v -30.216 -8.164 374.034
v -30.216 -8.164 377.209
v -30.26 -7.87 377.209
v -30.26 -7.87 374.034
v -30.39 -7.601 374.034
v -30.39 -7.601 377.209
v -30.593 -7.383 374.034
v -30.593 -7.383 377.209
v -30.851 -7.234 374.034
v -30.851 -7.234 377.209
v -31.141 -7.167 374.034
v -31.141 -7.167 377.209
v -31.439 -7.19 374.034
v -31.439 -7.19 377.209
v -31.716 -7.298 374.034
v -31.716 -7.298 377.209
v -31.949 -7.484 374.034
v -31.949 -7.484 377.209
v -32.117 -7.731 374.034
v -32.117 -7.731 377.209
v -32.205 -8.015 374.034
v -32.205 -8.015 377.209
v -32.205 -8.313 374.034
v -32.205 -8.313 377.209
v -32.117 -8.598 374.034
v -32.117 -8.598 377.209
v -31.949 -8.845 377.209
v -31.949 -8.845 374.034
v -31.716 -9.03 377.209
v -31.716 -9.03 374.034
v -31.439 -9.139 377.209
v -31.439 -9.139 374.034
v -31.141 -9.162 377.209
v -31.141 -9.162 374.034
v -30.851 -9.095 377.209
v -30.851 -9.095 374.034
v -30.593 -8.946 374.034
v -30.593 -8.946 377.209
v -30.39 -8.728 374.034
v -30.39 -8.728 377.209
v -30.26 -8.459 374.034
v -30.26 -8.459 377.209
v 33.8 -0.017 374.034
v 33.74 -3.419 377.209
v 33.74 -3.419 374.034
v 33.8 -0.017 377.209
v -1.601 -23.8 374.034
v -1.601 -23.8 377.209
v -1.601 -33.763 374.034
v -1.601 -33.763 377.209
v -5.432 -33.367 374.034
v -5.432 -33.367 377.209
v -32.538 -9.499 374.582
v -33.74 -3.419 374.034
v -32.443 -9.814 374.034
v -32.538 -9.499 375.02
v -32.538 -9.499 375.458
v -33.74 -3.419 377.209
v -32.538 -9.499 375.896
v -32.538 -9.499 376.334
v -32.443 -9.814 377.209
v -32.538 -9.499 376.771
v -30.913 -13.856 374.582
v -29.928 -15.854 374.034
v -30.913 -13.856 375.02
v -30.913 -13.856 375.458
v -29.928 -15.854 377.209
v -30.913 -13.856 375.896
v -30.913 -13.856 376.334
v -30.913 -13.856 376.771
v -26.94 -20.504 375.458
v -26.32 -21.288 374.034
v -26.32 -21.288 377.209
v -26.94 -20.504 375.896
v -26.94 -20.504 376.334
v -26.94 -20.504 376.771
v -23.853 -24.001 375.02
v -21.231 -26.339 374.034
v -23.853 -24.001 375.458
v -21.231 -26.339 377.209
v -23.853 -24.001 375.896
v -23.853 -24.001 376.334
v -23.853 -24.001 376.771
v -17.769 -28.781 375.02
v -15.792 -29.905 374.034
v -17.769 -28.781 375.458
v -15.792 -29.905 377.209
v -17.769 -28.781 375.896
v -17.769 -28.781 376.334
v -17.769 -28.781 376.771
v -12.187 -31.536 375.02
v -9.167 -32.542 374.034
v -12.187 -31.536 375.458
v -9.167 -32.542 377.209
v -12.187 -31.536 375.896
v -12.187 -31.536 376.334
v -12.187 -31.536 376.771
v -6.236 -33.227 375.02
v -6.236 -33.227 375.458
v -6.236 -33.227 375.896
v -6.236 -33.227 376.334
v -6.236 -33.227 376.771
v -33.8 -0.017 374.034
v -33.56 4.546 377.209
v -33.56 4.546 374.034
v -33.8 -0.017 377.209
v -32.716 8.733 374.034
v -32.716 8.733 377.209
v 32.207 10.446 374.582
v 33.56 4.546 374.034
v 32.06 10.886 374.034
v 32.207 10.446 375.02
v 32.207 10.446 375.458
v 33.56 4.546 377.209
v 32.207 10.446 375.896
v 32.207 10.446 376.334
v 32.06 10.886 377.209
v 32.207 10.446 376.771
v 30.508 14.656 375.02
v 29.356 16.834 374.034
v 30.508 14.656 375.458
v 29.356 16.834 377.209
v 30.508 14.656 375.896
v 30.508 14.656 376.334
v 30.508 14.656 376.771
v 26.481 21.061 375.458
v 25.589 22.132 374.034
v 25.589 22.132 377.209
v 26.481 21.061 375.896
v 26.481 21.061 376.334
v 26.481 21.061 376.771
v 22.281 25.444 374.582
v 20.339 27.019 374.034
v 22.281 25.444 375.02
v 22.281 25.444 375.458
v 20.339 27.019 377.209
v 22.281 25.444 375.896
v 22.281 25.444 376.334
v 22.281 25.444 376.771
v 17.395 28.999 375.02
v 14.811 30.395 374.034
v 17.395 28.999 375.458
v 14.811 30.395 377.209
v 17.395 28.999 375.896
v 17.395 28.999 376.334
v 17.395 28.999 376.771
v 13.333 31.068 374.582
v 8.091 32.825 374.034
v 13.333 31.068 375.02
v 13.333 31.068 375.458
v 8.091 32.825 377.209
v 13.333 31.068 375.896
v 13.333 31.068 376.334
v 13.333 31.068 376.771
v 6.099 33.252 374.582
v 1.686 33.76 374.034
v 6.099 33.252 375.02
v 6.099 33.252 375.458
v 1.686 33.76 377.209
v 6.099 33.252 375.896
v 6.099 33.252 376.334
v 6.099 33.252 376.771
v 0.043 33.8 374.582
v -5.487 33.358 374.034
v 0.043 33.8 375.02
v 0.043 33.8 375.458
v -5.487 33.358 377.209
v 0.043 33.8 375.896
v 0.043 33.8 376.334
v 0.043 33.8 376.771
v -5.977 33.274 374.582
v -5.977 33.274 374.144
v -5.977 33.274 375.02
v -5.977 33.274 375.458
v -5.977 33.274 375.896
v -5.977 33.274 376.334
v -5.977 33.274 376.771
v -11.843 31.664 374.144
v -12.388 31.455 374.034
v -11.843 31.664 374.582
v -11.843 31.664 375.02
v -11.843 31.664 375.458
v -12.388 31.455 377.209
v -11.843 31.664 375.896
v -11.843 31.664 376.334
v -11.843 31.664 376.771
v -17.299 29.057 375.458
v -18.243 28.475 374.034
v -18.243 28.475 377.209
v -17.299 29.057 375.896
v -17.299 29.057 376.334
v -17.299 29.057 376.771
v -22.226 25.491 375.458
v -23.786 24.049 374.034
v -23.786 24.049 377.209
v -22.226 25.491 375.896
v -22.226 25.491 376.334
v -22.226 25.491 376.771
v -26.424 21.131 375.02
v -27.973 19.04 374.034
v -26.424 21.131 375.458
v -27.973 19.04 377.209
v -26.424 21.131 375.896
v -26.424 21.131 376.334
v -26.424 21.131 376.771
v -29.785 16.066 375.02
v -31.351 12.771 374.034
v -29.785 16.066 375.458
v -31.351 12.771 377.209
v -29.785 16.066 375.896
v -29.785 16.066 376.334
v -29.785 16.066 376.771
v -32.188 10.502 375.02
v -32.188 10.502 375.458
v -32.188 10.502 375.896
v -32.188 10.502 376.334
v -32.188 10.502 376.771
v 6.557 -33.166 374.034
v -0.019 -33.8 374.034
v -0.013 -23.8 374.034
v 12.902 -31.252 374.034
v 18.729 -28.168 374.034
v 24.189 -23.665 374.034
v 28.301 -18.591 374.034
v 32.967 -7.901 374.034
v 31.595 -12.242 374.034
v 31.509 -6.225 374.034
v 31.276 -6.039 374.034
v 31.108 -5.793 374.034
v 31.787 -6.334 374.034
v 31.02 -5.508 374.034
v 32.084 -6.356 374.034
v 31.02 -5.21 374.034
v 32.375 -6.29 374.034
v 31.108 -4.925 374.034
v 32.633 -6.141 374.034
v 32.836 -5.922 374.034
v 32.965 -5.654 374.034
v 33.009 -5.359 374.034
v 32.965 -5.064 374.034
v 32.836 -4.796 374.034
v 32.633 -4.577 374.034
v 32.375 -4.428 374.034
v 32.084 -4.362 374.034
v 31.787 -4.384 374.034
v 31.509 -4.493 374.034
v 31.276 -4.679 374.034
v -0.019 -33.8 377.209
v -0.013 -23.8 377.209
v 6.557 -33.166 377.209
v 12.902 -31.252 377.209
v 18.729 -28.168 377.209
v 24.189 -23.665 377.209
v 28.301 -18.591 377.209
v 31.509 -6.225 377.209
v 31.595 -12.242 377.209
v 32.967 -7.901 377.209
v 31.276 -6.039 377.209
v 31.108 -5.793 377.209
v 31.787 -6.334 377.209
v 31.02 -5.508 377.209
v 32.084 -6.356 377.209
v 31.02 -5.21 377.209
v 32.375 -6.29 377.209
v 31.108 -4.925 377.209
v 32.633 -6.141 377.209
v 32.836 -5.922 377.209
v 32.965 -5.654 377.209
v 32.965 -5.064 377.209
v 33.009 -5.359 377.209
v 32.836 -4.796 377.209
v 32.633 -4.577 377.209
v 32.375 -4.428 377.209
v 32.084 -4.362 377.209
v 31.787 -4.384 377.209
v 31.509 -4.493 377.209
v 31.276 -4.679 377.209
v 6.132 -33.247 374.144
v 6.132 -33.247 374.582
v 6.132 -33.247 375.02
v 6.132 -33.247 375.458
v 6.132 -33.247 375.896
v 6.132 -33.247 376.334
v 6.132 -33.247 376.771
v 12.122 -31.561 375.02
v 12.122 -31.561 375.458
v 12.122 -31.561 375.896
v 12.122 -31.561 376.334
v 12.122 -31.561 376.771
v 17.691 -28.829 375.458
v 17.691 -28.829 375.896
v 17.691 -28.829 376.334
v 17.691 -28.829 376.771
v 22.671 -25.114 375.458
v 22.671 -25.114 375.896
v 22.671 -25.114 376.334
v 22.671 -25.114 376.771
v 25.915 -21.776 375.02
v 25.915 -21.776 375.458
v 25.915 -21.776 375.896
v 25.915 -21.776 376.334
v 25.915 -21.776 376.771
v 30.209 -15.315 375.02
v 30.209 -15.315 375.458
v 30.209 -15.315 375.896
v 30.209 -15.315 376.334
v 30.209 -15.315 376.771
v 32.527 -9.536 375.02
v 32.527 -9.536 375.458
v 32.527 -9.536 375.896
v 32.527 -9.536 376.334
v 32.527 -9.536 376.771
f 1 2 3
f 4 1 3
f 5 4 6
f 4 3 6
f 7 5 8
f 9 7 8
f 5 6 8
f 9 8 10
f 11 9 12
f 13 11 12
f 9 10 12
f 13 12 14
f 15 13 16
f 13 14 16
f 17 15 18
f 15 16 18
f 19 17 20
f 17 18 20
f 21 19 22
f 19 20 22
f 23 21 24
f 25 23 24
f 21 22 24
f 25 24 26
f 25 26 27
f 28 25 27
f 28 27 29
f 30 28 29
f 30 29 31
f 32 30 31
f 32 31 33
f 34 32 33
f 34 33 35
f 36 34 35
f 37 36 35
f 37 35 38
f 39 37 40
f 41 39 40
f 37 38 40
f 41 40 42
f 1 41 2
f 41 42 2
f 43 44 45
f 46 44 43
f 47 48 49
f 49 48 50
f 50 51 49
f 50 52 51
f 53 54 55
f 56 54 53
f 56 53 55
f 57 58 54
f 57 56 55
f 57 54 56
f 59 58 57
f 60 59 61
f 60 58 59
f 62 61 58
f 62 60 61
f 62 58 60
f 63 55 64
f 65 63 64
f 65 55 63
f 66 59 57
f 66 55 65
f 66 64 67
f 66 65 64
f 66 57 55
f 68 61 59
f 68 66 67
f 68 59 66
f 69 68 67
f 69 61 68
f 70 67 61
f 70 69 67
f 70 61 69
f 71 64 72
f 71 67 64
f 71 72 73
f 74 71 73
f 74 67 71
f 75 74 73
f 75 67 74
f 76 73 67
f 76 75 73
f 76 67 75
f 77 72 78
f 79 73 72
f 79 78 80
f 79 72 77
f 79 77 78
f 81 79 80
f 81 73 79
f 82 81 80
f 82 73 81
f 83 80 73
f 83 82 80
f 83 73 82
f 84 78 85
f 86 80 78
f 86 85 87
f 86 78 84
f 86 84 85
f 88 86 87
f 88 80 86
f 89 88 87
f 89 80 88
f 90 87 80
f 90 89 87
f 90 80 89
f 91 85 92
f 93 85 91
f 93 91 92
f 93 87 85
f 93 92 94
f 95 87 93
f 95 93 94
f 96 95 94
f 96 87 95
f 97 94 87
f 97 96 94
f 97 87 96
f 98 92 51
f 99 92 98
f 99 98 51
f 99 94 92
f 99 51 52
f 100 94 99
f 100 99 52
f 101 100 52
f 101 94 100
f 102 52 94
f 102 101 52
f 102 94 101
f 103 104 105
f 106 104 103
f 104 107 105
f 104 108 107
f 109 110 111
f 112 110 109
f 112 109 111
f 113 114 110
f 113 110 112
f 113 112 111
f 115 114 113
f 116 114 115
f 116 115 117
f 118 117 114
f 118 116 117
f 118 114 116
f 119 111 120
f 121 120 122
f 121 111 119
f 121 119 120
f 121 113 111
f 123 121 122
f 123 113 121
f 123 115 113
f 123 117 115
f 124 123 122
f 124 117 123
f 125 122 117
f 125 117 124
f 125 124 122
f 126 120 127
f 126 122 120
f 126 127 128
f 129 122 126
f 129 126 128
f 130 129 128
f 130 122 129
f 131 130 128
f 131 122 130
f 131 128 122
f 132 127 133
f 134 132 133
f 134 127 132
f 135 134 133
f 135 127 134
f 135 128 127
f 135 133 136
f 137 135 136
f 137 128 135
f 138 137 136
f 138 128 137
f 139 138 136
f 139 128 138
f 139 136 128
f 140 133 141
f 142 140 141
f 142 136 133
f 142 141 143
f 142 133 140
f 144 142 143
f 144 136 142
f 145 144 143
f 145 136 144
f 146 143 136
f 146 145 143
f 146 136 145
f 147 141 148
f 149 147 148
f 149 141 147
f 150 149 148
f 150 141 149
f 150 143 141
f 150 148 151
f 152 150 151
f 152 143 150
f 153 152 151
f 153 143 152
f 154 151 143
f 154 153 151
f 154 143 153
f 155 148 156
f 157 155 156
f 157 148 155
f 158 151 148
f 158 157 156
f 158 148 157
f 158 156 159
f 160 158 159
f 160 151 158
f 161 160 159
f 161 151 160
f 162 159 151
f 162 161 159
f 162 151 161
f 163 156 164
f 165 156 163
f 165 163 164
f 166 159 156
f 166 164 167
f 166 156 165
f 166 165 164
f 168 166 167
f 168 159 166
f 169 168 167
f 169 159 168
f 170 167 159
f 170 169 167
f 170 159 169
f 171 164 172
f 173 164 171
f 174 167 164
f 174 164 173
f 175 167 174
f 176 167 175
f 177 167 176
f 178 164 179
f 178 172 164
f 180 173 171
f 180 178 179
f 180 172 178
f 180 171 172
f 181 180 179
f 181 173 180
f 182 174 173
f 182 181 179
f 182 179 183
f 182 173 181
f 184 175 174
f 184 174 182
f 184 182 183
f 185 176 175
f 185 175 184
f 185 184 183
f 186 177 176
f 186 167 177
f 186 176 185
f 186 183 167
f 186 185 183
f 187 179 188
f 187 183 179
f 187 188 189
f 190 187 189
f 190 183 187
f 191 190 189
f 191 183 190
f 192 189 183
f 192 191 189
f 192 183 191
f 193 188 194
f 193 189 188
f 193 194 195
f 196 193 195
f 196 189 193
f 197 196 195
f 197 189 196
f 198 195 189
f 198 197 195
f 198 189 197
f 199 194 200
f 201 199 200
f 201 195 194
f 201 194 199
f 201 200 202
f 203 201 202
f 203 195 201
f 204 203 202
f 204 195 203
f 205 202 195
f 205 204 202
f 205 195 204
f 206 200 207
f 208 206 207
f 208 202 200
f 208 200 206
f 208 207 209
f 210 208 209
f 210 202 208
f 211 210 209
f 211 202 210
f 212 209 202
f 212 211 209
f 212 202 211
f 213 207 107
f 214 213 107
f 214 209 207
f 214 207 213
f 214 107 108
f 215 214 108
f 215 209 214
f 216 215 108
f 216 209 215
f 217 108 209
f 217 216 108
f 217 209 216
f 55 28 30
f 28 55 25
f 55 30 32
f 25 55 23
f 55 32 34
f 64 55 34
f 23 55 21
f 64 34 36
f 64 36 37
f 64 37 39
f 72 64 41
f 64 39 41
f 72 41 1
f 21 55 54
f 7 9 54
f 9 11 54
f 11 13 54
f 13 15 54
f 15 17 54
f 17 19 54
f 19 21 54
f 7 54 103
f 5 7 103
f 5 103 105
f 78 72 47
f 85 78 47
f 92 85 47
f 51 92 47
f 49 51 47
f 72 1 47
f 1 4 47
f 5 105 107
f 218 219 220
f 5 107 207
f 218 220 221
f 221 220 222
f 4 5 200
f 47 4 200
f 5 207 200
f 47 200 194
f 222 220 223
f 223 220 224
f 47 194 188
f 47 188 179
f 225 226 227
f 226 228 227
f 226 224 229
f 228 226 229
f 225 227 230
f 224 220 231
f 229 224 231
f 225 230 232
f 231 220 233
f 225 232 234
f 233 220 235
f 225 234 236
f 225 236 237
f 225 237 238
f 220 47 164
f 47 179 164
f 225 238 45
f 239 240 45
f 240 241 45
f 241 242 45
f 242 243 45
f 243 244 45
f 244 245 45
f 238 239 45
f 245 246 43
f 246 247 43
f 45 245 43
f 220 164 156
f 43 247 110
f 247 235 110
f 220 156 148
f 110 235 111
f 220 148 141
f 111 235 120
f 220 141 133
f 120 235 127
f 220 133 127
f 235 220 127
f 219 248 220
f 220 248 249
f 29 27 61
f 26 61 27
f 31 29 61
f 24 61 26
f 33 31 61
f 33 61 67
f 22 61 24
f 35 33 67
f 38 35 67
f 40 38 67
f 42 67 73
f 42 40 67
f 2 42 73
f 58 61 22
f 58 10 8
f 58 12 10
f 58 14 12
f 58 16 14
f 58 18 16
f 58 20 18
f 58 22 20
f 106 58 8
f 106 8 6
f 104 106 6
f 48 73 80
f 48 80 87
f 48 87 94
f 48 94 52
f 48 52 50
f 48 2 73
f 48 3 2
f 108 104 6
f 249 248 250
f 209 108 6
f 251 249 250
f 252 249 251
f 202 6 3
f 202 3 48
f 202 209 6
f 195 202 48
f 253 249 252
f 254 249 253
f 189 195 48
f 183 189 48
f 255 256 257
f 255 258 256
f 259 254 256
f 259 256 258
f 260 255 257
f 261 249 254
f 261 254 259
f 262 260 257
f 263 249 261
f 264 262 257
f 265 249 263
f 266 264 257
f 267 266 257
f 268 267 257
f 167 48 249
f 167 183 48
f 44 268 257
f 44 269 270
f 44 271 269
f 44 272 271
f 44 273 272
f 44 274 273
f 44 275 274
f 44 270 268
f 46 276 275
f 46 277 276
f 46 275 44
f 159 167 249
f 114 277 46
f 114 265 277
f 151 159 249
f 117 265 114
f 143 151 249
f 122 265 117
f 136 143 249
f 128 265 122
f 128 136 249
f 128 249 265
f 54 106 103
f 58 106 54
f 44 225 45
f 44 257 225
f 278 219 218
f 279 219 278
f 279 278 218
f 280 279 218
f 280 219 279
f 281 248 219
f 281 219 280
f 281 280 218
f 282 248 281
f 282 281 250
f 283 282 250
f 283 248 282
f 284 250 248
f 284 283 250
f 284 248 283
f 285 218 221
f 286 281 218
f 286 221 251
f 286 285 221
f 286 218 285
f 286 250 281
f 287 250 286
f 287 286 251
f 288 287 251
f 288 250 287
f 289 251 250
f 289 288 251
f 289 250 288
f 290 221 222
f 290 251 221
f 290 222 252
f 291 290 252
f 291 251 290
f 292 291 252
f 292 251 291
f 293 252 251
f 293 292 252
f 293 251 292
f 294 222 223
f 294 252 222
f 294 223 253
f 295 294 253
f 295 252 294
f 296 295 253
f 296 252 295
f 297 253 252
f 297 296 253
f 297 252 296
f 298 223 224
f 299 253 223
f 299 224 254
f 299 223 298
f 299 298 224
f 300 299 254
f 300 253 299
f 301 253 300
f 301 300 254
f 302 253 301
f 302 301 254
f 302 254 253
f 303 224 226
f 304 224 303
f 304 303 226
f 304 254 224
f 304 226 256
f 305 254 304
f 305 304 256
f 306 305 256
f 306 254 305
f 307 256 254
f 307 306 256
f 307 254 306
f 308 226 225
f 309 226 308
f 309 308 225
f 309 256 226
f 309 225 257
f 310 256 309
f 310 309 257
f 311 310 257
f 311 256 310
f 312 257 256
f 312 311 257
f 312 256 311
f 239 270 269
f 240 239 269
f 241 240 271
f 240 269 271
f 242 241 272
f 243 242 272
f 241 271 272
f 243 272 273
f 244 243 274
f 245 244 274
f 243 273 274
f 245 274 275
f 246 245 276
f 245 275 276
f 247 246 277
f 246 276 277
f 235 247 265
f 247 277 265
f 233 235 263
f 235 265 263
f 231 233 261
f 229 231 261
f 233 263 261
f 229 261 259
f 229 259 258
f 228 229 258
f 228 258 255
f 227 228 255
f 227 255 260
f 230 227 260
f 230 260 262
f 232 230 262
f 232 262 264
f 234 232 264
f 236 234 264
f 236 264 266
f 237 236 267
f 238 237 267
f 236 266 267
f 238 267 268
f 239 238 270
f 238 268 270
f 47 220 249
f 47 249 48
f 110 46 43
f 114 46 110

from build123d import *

# Parameters (mm, degrees)
BOSS_EXTRUDE1_DEPTH = 3.175
SKETCH2_R           = 1
CUT_EXTRUDE1_DEPTH  = 3.175
CUT_EXTRUDE2_DEPTH  = 3.175


with BuildPart() as part:
    # Sketch1 → Boss-Extrude1 (new body)
    with BuildSketch(Plane.XY.offset(377.209374622)):
        with BuildLine():
            Line((-33.799525455, -0.017072147), (-33.740147252, -3.418847174))
            add(Edge.make_bspline(
                [(-33.740147252, -3.418847174), (-33.521913435, -5.496739744), (-33.121758608, -7.52360336), (-32.245655467, -10.48651683), (-31.738647045, -11.948631126), (-31.127755378, -13.381606109), (-30.697366268, -14.330435347), (-30.470378572, -14.801900059), (-29.290211733, -17.119612441), (-27.644930506, -19.740333777), (-25.646898465, -22.113857284), (-24.588376817, -23.258919171), (-24.224726915, -23.634521718), (-23.482012785, -24.367327148), (-21.59014774, -26.150424449), (-18.705670827, -28.317861845), (-15.980786711, -29.823605713), (-14.107006772, -30.74768667), (-13.152701084, -31.164175695), (-10.256242476, -32.27934775), (-7.777960893, -32.988270972), (-5.214339656, -33.405899808), (-4.181967985, -33.549320099), (-3.661328308, -33.60925586), (-2.104532681, -33.751997759), (-1.069213869, -33.798542764), (2.029597644, -33.801687472), (4.085962141, -33.622116253), (7.155117004, -33.058726493), (8.178081257, -32.820670852), (10.177000978, -32.256577633), (11.158104767, -31.929888742), (14.04936497, -30.823232748), (15.907936031, -29.917809181), (18.13673294, -28.556406158), (18.576889104, -28.273087614), (19.438710135, -27.689460729), (20.706973253, -26.786573761), (21.903631517, -25.803366446), (23.438553372, -24.424422105), (24.544411843, -23.339363165), (25.578640539, -22.173955923), (26.251776296, -21.378677652), (26.580969723, -20.970778515), (28.17094662, -18.902925334), (29.269671397, -17.152899222), (30.678907287, -14.395868232), (31.108821176, -13.454846631), (31.884053374, -11.526054988), (32.230015293, -10.534907216), (33.119638114, -7.539302803), (33.521651228, -5.499562958), (33.740182048, -3.418847117)],
                knots=[0, 0, 0, 0, 0.0625, 0.0625, 0.09375, 0.109375, 0.109375, 0.125, 0.125, 0.1875, 0.21875, 0.21875, 0.234375, 0.234375, 0.25, 0.3125, 0.34375, 0.34375, 0.375, 0.375, 0.4375, 0.453125, 0.453125, 0.46875, 0.46875, 0.5, 0.5, 0.5625, 0.5625, 0.59375, 0.59375, 0.625, 0.625, 0.6875, 0.6875, 0.703125, 0.703125, 0.71875, 0.75, 0.75, 0.78125, 0.796875, 0.796875, 0.8125, 0.8125, 0.875, 0.875, 0.90625, 0.90625, 0.9375, 0.9375, 1, 1, 1, 1], degree=3))
            Line((33.740182048, -3.418847117), (33.799560251, -0.017072147))
            Line((33.799560251, -0.017072147), (33.560412457, 4.546139609))
            add(Edge.make_bspline(
                [(33.560412457, 4.546139609), (33.282065399, 6.567374379), (32.831372803, 8.534230691), (31.894626922, 11.402256897), (31.361087401, 12.815708643), (30.729491779, 14.19822173), (30.286610148, 15.113013144), (30.053701075, 15.567925007), (28.845742701, 17.805295292), (27.73617385, 19.487837269), (25.852855801, 21.84749908), (25.188593752, 22.606698061), (23.786460552, 24.069913543), (23.045059446, 24.776640829), (20.752328135, 26.778284029), (18.311067746, 28.558159122), (15.640647898, 29.995877244), (14.266739996, 30.656956524), (13.801141084, 30.868163008), (12.864758887, 31.267971853), (12.393699461, 31.456783193), (10.024605965, 32.347483289), (7.115279765, 33.1594713), (4.10232218, 33.57067126), (2.070213322, 33.754033964), (1.053662161, 33.799146951), (-1.978663229, 33.802802386), (-4.487220386, 33.587681269), (-6.97150073, 33.084409187), (-7.963243622, 32.859726611), (-8.459399615, 32.73533069), (-9.933669217, 32.329805435), (-10.897365307, 32.016750487), (-13.734609646, 30.957514861), (-15.554750033, 30.092235814), (-17.734673571, 28.798227251), (-18.165893543, 28.52880028), (-19.018645374, 27.968342063), (-19.439187613, 27.677889019), (-20.673952363, 26.783179445), (-21.465207676, 26.153069384), (-23.74871726, 24.167631397), (-25.151109466, 22.717611147), (-26.742507526, 20.734807748), (-27.053436756, 20.328702835), (-27.654958645, 19.504501759), (-28.525682186, 18.252011757), (-29.304349299, 16.952301265), (-30.745483656, 14.293275375), (-31.551336523, 12.44113352), (-32.506911863, 9.533039369), (-32.781055324, 8.547728647), (-33.237634192, 6.561909519), (-33.420905282, 5.558925362), (-33.560377664, 4.546139552)],
                knots=[0, 0, 0, 0, 0.0625, 0.0625, 0.09375, 0.109375, 0.109375, 0.125, 0.125, 0.1875, 0.1875, 0.21875, 0.21875, 0.25, 0.25, 0.3125, 0.34375, 0.34375, 0.359375, 0.359375, 0.375, 0.375, 0.4375, 0.46875, 0.46875, 0.5, 0.5, 0.5625, 0.578125, 0.578125, 0.59375, 0.59375, 0.625, 0.625, 0.6875, 0.6875, 0.703125, 0.703125, 0.71875, 0.71875, 0.75, 0.75, 0.8125, 0.8125, 0.828125, 0.828125, 0.84375, 0.875, 0.875, 0.9375, 0.9375, 0.96875, 0.96875, 1, 1, 1, 1], degree=3))
            Line((-33.560377664, 4.546139552), (-33.799525455, -0.017072147))
        make_face()
    extrude(amount=-BOSS_EXTRUDE1_DEPTH)

    # Sketch2 → Cut-Extrude1 (cut)
    with BuildSketch(Plane.XY.offset(377.209374622)):
        with Locations((32.009302375, -5.358989516)):
            Circle(SKETCH2_R)
        with Locations((-31.216064399, -8.164436653)):
            Circle(SKETCH2_R)
    extrude(amount=-CUT_EXTRUDE1_DEPTH, mode=Mode.SUBTRACT)

    # Sketch3 → Cut-Extrude2 (cut)
    with BuildSketch(Plane.XY.offset(377.209374622)):
        with BuildLine():
            Line((-0.018642697, -33.799604512), (-0.013127042, -23.799604512))
            Line((-0.013127042, -23.799604512), (-1.600627042, -23.799604512))
            Line((-1.600627042, -23.799604512), (-1.600627042, -33.762903096))
            add(Edge.make_bspline(
                [(-1.600627042, -33.762903096), (-1.078557444, -33.786966452), (-0.557114308, -33.799062449), (-0.030398621, -33.799596965), (-0.024520621, -33.79960146), (-0.018642697, -33.799604483)],
                knots=[0.484242822, 0.484242822, 0.484242822, 0.484242822, 0.5, 0.5, 0.500177833, 0.500177833, 0.500177833, 0.500177833], degree=3))
        make_face()
    extrude(amount=-CUT_EXTRUDE2_DEPTH, mode=Mode.SUBTRACT)


solid = part.part
